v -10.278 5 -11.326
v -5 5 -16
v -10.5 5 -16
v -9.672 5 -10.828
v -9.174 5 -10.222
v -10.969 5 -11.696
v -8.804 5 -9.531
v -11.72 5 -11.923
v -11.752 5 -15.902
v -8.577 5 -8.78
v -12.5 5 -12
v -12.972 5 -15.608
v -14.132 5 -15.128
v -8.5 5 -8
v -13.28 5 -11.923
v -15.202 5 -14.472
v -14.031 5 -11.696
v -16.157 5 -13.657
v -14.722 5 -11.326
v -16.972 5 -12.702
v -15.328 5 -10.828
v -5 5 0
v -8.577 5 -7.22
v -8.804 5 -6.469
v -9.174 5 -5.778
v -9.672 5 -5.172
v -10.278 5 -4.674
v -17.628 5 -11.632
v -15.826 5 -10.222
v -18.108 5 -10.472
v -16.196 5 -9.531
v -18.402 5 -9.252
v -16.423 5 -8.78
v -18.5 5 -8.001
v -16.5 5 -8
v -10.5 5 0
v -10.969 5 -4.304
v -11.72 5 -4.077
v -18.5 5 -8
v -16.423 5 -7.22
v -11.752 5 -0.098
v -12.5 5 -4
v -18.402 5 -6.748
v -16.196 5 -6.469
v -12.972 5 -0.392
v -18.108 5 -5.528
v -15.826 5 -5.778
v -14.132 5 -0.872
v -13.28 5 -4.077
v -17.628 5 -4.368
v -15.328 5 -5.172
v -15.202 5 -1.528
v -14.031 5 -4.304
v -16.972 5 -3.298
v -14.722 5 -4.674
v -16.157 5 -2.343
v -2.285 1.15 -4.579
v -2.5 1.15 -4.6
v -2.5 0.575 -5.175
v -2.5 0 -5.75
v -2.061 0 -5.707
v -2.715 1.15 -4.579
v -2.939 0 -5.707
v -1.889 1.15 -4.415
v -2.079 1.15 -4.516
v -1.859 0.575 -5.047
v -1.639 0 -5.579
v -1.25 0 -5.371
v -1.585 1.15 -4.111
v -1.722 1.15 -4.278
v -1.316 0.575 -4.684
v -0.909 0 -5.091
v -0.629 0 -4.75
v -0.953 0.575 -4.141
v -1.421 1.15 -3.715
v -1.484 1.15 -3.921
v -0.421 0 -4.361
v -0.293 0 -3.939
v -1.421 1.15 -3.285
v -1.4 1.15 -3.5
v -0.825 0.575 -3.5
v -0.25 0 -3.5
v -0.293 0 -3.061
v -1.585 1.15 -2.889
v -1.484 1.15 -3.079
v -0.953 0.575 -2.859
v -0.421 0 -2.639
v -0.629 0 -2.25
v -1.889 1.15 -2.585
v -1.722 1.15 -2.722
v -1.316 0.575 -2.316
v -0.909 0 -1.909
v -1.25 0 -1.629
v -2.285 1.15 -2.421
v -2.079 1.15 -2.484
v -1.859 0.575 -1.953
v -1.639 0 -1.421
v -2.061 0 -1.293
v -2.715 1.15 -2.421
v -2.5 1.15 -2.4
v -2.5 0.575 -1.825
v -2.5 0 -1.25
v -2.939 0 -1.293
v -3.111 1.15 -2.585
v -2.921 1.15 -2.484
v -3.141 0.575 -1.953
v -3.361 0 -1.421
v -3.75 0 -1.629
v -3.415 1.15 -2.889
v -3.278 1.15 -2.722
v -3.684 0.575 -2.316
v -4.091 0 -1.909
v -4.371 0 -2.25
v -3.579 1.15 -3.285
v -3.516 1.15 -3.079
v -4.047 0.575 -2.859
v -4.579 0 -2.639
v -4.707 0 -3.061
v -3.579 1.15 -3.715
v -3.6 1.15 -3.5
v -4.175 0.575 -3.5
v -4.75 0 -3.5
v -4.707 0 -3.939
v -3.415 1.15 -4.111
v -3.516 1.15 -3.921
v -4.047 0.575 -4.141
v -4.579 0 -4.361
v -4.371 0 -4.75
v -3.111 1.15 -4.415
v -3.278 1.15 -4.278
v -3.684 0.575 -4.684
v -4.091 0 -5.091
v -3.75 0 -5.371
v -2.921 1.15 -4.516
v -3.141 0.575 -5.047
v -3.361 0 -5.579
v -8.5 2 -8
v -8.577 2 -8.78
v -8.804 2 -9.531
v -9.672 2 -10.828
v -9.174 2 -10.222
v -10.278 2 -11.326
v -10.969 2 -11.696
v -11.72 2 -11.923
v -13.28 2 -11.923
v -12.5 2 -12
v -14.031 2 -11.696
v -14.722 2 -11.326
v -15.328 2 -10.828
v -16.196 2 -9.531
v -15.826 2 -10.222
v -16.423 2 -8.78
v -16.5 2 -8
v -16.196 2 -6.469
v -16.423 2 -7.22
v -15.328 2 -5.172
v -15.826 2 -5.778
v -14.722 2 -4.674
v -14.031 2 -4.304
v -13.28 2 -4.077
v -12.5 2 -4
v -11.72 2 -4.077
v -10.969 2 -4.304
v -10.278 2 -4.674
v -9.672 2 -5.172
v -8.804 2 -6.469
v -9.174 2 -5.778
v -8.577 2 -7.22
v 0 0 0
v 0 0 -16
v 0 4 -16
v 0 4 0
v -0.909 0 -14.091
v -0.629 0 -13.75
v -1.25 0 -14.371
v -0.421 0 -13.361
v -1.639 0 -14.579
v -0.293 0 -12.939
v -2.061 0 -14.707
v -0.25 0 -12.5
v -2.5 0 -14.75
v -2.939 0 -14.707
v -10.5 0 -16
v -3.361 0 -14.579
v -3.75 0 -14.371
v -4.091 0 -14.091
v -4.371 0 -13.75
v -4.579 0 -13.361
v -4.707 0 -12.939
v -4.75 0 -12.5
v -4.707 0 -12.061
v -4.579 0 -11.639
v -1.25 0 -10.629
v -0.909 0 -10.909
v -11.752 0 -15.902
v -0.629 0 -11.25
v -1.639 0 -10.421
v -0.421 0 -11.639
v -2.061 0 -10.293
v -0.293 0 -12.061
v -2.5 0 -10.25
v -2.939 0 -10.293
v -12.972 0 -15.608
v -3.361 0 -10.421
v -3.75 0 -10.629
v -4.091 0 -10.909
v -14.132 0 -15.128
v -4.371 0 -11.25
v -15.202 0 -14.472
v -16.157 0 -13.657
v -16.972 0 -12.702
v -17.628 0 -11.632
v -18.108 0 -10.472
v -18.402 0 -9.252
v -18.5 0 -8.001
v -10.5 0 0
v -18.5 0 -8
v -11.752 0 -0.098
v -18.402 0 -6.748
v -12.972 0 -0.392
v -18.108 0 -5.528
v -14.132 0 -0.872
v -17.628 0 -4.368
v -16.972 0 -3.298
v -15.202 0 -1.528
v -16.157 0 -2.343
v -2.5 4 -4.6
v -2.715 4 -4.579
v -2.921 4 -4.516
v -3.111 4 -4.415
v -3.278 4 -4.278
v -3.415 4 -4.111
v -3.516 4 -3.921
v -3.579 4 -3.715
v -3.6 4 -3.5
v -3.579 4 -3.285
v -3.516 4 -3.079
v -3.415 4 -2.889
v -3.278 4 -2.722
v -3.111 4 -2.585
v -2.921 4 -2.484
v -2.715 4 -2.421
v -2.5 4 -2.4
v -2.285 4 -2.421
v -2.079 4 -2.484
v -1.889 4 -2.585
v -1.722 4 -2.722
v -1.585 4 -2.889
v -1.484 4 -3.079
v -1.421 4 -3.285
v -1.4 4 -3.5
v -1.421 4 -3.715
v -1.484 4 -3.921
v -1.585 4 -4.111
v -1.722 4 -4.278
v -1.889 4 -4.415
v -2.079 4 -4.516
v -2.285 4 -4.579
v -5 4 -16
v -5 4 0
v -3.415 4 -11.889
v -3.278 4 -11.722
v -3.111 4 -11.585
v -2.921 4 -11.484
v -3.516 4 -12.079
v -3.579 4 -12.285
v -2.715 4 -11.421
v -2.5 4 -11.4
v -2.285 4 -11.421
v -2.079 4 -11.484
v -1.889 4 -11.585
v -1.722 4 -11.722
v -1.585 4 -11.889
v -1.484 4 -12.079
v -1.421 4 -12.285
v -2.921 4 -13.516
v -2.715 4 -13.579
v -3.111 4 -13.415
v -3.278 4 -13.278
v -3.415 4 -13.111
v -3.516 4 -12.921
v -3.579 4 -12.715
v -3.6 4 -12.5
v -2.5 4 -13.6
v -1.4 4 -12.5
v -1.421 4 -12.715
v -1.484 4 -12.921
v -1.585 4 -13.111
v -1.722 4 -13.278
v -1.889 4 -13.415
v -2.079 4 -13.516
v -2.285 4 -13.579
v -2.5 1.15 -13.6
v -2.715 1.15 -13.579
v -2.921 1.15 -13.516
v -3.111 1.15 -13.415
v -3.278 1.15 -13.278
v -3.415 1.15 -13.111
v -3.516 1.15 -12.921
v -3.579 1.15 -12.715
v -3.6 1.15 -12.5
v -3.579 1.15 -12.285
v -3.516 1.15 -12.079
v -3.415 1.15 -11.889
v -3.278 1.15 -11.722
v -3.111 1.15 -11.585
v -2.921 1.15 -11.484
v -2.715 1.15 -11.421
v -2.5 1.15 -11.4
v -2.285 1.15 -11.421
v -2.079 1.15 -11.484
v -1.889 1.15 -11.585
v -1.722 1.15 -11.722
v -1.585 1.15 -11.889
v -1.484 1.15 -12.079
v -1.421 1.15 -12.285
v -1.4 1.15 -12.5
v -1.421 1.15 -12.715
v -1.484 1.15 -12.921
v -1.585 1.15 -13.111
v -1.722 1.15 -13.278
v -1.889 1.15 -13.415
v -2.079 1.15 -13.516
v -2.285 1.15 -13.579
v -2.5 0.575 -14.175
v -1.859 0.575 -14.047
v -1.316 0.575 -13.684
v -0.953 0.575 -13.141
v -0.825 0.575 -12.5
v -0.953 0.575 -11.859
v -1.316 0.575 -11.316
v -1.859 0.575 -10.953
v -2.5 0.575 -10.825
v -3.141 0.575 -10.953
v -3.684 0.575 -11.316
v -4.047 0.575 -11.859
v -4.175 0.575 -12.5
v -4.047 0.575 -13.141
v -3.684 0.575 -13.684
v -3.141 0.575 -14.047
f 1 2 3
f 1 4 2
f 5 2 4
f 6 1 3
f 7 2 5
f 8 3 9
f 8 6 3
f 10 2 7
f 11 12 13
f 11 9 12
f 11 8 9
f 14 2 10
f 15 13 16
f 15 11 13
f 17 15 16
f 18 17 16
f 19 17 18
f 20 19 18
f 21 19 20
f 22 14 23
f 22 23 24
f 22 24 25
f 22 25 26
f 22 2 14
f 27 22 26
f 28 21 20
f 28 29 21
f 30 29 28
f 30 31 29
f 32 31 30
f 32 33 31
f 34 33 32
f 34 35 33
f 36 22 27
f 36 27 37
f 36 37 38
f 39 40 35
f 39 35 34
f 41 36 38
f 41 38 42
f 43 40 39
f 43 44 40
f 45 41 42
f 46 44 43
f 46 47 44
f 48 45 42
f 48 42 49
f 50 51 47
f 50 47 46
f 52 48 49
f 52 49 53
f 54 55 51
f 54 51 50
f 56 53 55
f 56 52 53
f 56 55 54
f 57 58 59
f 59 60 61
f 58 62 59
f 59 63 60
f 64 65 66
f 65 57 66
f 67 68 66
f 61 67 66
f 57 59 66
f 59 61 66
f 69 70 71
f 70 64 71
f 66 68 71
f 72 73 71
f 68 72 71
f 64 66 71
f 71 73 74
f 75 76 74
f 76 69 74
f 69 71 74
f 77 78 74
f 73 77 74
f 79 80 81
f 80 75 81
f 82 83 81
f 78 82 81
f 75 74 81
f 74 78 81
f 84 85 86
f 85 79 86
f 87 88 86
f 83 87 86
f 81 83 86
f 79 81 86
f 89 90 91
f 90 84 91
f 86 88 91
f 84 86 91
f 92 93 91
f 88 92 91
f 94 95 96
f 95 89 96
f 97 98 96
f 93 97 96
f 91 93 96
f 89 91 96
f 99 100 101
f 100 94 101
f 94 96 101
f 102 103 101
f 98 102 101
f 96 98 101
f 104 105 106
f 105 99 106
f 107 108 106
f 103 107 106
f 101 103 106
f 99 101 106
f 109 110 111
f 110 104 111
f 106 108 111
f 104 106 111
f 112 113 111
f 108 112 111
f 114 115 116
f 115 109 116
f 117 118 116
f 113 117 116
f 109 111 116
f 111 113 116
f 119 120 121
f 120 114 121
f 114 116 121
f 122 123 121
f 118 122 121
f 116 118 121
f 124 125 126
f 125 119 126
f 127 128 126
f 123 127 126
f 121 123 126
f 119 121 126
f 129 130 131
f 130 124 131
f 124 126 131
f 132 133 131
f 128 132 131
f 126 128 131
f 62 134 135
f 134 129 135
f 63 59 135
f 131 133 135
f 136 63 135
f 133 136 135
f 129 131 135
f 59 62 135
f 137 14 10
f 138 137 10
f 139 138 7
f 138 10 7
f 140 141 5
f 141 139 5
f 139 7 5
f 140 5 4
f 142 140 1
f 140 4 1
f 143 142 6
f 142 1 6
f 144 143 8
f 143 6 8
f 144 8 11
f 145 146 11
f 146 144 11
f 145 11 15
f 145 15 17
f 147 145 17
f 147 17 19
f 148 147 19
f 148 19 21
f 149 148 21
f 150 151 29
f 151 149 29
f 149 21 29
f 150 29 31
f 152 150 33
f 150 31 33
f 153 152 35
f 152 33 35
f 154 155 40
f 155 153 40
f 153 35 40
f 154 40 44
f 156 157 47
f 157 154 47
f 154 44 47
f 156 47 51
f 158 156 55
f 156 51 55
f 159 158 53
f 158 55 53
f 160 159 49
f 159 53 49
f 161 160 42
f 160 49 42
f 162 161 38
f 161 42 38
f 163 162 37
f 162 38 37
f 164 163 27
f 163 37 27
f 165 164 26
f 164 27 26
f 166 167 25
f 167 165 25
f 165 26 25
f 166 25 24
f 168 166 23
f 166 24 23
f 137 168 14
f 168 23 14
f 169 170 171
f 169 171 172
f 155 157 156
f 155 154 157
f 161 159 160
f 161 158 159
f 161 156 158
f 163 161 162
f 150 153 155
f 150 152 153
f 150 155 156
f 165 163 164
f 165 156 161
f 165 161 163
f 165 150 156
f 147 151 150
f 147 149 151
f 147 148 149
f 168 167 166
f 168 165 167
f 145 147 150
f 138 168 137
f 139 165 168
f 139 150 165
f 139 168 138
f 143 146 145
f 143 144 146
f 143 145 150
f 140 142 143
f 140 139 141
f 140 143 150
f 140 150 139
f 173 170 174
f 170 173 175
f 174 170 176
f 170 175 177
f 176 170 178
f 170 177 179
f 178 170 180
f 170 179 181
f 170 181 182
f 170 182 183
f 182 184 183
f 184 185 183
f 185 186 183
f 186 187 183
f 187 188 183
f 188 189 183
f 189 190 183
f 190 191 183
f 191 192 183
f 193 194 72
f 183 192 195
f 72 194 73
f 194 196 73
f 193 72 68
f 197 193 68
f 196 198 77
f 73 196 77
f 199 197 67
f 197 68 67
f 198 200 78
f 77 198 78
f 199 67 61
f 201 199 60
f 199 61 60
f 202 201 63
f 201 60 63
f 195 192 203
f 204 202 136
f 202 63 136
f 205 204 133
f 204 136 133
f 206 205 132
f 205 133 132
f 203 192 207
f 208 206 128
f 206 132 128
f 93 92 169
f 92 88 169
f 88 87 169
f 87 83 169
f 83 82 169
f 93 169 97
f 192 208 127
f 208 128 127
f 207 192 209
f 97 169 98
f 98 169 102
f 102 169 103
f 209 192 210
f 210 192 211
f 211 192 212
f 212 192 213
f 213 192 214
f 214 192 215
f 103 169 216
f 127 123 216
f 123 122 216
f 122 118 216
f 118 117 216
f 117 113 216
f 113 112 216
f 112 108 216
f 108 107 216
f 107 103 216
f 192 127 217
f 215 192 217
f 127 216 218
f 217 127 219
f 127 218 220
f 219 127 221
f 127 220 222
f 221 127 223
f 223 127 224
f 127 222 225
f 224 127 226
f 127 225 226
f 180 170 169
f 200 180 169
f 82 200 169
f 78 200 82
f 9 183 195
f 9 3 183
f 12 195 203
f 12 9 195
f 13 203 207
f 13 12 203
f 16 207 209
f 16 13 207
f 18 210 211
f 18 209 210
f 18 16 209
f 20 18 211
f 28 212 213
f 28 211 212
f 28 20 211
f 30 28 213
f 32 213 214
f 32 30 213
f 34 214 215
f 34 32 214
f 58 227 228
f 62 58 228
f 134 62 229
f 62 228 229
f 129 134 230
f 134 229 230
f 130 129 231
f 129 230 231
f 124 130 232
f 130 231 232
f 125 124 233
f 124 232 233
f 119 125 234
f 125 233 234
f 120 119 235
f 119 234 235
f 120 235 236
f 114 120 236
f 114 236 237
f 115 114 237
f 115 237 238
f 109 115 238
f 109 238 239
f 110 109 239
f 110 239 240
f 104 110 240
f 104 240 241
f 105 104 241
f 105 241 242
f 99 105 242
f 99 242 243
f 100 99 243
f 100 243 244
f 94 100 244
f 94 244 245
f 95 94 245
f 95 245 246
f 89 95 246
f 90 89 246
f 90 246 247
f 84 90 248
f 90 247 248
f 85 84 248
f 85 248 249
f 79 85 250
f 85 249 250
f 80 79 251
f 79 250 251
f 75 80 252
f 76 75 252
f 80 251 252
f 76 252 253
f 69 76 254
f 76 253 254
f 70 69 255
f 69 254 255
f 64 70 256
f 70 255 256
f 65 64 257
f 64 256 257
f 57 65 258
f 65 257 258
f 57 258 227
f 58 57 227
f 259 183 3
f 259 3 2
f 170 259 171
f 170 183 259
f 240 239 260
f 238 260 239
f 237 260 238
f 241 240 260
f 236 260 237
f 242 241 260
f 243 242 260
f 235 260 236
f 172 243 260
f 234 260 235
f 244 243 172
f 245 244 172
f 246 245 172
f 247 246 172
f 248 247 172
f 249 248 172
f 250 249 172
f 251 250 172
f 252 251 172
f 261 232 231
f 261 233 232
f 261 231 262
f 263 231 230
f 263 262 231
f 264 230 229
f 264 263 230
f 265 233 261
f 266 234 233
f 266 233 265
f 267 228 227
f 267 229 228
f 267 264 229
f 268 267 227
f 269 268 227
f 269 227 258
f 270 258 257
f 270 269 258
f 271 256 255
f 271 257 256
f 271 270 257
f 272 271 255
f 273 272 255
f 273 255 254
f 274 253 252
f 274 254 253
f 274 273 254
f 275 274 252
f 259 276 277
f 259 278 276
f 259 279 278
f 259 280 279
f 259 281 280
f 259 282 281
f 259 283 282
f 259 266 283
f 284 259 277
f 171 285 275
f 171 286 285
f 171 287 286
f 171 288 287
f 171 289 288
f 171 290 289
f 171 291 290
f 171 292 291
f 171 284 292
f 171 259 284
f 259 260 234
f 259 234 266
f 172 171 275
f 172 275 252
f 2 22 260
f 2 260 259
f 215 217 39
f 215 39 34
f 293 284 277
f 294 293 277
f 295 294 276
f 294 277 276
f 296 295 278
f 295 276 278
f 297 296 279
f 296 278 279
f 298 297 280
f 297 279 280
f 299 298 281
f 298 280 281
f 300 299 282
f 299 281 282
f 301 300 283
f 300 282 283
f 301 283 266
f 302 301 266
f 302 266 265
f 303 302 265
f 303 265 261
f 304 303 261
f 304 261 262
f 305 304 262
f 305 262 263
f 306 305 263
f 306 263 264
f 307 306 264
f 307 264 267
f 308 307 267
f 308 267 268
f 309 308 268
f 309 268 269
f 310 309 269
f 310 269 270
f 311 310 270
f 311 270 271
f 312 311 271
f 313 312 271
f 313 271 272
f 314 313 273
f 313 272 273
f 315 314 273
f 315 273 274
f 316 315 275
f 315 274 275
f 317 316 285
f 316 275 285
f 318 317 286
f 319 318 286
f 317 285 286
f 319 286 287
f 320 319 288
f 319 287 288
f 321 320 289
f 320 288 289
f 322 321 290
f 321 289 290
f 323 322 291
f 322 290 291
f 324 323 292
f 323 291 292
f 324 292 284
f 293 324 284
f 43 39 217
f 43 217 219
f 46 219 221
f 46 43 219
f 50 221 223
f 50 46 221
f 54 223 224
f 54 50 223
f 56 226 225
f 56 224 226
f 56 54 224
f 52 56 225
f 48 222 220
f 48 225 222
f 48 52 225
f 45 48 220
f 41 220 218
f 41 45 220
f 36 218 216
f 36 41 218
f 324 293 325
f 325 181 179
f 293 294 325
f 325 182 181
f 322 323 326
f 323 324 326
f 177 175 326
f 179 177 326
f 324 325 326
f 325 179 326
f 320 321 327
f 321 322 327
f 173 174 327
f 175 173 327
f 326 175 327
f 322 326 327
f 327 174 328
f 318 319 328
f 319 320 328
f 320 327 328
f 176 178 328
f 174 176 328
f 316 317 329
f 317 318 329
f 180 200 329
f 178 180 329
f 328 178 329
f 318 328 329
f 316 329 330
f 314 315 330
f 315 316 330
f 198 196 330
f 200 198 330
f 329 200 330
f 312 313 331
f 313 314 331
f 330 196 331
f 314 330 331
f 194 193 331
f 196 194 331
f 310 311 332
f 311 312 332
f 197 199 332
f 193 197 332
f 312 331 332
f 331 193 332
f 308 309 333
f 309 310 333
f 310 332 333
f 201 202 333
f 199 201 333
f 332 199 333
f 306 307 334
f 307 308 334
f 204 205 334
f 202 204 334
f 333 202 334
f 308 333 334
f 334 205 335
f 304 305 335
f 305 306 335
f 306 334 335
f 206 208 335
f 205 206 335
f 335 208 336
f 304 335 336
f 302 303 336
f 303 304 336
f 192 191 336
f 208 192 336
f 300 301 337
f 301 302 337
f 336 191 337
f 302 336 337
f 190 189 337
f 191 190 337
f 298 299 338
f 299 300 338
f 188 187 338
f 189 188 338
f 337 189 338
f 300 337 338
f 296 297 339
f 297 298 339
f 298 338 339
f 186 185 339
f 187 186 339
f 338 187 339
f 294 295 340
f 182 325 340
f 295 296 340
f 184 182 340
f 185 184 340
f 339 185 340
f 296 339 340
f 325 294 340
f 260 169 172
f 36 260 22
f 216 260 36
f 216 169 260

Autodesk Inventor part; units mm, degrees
ref_plane "YZ Plane" through (0, 0, 0) normal (1, 0, 0) x (0, 1, 0)
ref_plane "XZ Plane" through (0, 0, 0) normal (0, 1, 0) x (-1, 0, 0)
ref_plane "XY Plane" through (0, 0, 0) normal (0, 0, 1) x (1, 0, 0)
sketch "Эскиз1" plane through (0, 0, 0) normal (0, 1, 0) x (-1, 0, 0)
  line L0 (0, 0) -> (18.5, 0)
  line L1 (18.5, 0) -> (18.5, -16)
  line L2 (18.5, -16) -> (0, -16)
  line L3 (0, -16) -> (0, 0)
  dimension "d0" = 18.5
  dimension "d1" = 16
extrude "Выдавливание1" add sketch "Эскиз1" along normal blind 5
sketch "Эскиз2" plane through (0, 5, 0) normal (0, 1, 0) x (1, 0, 0)
  line L0 (-18.5, 16) -> (-18.5, 0) projected
  line L1 (-18.5, 8) -> (-12.5, 8)
  circle A0 centre (-12.5, 8) radius 4
  point P0 (0, 0)
  dimension "d4" = 6
  dimension "d5" = 8
extrude "Выдавливание2" cut sketch "Эскиз2" against normal blind 3
fillet "Сопряжение1" radius 8 2 edges at (-18.5, 2.5, 0) (-18.5, 2.5, -16)
sketch "Эскиз3" plane through (0, 0, 0) normal (0, -1, 0) x (1, 0, 0)
  line L0 (0, 0) -> (0, -16) projected
  line L1 (0, -8) -> (-2.5, -8)
  line L2 (-2.5, -3.5) -> (-2.5, -12.5)
  dimension "d9" = 2.5
  dimension "d10" = 9
hole "Отверстие1" at (-2.5, 0, -3.5) at (-2.5, 0, -12.5) direction (0, 1, 0) diameter 2.2 end through all countersink diameter 4.5 countersink angle 90
sketch "Эскиз4" plane through (0, 5, 0) normal (0, 1, 0) x (1, 0, 0)
  line L0 (0, 0) -> (-5, 0)
  line L1 (-5, 0) -> (-5, 16)
  line L2 (-5, 16) -> (0, 16)
  line L3 (0, 16) -> (0, 0)
  line L4 (0, 16) -> (-10.5, 16) projected
  dimension "d18" = 5
extrude "Выдавливание3" cut sketch "Эскиз4" against normal blind 1
properties part number "Деталь основы рулевого управления"
